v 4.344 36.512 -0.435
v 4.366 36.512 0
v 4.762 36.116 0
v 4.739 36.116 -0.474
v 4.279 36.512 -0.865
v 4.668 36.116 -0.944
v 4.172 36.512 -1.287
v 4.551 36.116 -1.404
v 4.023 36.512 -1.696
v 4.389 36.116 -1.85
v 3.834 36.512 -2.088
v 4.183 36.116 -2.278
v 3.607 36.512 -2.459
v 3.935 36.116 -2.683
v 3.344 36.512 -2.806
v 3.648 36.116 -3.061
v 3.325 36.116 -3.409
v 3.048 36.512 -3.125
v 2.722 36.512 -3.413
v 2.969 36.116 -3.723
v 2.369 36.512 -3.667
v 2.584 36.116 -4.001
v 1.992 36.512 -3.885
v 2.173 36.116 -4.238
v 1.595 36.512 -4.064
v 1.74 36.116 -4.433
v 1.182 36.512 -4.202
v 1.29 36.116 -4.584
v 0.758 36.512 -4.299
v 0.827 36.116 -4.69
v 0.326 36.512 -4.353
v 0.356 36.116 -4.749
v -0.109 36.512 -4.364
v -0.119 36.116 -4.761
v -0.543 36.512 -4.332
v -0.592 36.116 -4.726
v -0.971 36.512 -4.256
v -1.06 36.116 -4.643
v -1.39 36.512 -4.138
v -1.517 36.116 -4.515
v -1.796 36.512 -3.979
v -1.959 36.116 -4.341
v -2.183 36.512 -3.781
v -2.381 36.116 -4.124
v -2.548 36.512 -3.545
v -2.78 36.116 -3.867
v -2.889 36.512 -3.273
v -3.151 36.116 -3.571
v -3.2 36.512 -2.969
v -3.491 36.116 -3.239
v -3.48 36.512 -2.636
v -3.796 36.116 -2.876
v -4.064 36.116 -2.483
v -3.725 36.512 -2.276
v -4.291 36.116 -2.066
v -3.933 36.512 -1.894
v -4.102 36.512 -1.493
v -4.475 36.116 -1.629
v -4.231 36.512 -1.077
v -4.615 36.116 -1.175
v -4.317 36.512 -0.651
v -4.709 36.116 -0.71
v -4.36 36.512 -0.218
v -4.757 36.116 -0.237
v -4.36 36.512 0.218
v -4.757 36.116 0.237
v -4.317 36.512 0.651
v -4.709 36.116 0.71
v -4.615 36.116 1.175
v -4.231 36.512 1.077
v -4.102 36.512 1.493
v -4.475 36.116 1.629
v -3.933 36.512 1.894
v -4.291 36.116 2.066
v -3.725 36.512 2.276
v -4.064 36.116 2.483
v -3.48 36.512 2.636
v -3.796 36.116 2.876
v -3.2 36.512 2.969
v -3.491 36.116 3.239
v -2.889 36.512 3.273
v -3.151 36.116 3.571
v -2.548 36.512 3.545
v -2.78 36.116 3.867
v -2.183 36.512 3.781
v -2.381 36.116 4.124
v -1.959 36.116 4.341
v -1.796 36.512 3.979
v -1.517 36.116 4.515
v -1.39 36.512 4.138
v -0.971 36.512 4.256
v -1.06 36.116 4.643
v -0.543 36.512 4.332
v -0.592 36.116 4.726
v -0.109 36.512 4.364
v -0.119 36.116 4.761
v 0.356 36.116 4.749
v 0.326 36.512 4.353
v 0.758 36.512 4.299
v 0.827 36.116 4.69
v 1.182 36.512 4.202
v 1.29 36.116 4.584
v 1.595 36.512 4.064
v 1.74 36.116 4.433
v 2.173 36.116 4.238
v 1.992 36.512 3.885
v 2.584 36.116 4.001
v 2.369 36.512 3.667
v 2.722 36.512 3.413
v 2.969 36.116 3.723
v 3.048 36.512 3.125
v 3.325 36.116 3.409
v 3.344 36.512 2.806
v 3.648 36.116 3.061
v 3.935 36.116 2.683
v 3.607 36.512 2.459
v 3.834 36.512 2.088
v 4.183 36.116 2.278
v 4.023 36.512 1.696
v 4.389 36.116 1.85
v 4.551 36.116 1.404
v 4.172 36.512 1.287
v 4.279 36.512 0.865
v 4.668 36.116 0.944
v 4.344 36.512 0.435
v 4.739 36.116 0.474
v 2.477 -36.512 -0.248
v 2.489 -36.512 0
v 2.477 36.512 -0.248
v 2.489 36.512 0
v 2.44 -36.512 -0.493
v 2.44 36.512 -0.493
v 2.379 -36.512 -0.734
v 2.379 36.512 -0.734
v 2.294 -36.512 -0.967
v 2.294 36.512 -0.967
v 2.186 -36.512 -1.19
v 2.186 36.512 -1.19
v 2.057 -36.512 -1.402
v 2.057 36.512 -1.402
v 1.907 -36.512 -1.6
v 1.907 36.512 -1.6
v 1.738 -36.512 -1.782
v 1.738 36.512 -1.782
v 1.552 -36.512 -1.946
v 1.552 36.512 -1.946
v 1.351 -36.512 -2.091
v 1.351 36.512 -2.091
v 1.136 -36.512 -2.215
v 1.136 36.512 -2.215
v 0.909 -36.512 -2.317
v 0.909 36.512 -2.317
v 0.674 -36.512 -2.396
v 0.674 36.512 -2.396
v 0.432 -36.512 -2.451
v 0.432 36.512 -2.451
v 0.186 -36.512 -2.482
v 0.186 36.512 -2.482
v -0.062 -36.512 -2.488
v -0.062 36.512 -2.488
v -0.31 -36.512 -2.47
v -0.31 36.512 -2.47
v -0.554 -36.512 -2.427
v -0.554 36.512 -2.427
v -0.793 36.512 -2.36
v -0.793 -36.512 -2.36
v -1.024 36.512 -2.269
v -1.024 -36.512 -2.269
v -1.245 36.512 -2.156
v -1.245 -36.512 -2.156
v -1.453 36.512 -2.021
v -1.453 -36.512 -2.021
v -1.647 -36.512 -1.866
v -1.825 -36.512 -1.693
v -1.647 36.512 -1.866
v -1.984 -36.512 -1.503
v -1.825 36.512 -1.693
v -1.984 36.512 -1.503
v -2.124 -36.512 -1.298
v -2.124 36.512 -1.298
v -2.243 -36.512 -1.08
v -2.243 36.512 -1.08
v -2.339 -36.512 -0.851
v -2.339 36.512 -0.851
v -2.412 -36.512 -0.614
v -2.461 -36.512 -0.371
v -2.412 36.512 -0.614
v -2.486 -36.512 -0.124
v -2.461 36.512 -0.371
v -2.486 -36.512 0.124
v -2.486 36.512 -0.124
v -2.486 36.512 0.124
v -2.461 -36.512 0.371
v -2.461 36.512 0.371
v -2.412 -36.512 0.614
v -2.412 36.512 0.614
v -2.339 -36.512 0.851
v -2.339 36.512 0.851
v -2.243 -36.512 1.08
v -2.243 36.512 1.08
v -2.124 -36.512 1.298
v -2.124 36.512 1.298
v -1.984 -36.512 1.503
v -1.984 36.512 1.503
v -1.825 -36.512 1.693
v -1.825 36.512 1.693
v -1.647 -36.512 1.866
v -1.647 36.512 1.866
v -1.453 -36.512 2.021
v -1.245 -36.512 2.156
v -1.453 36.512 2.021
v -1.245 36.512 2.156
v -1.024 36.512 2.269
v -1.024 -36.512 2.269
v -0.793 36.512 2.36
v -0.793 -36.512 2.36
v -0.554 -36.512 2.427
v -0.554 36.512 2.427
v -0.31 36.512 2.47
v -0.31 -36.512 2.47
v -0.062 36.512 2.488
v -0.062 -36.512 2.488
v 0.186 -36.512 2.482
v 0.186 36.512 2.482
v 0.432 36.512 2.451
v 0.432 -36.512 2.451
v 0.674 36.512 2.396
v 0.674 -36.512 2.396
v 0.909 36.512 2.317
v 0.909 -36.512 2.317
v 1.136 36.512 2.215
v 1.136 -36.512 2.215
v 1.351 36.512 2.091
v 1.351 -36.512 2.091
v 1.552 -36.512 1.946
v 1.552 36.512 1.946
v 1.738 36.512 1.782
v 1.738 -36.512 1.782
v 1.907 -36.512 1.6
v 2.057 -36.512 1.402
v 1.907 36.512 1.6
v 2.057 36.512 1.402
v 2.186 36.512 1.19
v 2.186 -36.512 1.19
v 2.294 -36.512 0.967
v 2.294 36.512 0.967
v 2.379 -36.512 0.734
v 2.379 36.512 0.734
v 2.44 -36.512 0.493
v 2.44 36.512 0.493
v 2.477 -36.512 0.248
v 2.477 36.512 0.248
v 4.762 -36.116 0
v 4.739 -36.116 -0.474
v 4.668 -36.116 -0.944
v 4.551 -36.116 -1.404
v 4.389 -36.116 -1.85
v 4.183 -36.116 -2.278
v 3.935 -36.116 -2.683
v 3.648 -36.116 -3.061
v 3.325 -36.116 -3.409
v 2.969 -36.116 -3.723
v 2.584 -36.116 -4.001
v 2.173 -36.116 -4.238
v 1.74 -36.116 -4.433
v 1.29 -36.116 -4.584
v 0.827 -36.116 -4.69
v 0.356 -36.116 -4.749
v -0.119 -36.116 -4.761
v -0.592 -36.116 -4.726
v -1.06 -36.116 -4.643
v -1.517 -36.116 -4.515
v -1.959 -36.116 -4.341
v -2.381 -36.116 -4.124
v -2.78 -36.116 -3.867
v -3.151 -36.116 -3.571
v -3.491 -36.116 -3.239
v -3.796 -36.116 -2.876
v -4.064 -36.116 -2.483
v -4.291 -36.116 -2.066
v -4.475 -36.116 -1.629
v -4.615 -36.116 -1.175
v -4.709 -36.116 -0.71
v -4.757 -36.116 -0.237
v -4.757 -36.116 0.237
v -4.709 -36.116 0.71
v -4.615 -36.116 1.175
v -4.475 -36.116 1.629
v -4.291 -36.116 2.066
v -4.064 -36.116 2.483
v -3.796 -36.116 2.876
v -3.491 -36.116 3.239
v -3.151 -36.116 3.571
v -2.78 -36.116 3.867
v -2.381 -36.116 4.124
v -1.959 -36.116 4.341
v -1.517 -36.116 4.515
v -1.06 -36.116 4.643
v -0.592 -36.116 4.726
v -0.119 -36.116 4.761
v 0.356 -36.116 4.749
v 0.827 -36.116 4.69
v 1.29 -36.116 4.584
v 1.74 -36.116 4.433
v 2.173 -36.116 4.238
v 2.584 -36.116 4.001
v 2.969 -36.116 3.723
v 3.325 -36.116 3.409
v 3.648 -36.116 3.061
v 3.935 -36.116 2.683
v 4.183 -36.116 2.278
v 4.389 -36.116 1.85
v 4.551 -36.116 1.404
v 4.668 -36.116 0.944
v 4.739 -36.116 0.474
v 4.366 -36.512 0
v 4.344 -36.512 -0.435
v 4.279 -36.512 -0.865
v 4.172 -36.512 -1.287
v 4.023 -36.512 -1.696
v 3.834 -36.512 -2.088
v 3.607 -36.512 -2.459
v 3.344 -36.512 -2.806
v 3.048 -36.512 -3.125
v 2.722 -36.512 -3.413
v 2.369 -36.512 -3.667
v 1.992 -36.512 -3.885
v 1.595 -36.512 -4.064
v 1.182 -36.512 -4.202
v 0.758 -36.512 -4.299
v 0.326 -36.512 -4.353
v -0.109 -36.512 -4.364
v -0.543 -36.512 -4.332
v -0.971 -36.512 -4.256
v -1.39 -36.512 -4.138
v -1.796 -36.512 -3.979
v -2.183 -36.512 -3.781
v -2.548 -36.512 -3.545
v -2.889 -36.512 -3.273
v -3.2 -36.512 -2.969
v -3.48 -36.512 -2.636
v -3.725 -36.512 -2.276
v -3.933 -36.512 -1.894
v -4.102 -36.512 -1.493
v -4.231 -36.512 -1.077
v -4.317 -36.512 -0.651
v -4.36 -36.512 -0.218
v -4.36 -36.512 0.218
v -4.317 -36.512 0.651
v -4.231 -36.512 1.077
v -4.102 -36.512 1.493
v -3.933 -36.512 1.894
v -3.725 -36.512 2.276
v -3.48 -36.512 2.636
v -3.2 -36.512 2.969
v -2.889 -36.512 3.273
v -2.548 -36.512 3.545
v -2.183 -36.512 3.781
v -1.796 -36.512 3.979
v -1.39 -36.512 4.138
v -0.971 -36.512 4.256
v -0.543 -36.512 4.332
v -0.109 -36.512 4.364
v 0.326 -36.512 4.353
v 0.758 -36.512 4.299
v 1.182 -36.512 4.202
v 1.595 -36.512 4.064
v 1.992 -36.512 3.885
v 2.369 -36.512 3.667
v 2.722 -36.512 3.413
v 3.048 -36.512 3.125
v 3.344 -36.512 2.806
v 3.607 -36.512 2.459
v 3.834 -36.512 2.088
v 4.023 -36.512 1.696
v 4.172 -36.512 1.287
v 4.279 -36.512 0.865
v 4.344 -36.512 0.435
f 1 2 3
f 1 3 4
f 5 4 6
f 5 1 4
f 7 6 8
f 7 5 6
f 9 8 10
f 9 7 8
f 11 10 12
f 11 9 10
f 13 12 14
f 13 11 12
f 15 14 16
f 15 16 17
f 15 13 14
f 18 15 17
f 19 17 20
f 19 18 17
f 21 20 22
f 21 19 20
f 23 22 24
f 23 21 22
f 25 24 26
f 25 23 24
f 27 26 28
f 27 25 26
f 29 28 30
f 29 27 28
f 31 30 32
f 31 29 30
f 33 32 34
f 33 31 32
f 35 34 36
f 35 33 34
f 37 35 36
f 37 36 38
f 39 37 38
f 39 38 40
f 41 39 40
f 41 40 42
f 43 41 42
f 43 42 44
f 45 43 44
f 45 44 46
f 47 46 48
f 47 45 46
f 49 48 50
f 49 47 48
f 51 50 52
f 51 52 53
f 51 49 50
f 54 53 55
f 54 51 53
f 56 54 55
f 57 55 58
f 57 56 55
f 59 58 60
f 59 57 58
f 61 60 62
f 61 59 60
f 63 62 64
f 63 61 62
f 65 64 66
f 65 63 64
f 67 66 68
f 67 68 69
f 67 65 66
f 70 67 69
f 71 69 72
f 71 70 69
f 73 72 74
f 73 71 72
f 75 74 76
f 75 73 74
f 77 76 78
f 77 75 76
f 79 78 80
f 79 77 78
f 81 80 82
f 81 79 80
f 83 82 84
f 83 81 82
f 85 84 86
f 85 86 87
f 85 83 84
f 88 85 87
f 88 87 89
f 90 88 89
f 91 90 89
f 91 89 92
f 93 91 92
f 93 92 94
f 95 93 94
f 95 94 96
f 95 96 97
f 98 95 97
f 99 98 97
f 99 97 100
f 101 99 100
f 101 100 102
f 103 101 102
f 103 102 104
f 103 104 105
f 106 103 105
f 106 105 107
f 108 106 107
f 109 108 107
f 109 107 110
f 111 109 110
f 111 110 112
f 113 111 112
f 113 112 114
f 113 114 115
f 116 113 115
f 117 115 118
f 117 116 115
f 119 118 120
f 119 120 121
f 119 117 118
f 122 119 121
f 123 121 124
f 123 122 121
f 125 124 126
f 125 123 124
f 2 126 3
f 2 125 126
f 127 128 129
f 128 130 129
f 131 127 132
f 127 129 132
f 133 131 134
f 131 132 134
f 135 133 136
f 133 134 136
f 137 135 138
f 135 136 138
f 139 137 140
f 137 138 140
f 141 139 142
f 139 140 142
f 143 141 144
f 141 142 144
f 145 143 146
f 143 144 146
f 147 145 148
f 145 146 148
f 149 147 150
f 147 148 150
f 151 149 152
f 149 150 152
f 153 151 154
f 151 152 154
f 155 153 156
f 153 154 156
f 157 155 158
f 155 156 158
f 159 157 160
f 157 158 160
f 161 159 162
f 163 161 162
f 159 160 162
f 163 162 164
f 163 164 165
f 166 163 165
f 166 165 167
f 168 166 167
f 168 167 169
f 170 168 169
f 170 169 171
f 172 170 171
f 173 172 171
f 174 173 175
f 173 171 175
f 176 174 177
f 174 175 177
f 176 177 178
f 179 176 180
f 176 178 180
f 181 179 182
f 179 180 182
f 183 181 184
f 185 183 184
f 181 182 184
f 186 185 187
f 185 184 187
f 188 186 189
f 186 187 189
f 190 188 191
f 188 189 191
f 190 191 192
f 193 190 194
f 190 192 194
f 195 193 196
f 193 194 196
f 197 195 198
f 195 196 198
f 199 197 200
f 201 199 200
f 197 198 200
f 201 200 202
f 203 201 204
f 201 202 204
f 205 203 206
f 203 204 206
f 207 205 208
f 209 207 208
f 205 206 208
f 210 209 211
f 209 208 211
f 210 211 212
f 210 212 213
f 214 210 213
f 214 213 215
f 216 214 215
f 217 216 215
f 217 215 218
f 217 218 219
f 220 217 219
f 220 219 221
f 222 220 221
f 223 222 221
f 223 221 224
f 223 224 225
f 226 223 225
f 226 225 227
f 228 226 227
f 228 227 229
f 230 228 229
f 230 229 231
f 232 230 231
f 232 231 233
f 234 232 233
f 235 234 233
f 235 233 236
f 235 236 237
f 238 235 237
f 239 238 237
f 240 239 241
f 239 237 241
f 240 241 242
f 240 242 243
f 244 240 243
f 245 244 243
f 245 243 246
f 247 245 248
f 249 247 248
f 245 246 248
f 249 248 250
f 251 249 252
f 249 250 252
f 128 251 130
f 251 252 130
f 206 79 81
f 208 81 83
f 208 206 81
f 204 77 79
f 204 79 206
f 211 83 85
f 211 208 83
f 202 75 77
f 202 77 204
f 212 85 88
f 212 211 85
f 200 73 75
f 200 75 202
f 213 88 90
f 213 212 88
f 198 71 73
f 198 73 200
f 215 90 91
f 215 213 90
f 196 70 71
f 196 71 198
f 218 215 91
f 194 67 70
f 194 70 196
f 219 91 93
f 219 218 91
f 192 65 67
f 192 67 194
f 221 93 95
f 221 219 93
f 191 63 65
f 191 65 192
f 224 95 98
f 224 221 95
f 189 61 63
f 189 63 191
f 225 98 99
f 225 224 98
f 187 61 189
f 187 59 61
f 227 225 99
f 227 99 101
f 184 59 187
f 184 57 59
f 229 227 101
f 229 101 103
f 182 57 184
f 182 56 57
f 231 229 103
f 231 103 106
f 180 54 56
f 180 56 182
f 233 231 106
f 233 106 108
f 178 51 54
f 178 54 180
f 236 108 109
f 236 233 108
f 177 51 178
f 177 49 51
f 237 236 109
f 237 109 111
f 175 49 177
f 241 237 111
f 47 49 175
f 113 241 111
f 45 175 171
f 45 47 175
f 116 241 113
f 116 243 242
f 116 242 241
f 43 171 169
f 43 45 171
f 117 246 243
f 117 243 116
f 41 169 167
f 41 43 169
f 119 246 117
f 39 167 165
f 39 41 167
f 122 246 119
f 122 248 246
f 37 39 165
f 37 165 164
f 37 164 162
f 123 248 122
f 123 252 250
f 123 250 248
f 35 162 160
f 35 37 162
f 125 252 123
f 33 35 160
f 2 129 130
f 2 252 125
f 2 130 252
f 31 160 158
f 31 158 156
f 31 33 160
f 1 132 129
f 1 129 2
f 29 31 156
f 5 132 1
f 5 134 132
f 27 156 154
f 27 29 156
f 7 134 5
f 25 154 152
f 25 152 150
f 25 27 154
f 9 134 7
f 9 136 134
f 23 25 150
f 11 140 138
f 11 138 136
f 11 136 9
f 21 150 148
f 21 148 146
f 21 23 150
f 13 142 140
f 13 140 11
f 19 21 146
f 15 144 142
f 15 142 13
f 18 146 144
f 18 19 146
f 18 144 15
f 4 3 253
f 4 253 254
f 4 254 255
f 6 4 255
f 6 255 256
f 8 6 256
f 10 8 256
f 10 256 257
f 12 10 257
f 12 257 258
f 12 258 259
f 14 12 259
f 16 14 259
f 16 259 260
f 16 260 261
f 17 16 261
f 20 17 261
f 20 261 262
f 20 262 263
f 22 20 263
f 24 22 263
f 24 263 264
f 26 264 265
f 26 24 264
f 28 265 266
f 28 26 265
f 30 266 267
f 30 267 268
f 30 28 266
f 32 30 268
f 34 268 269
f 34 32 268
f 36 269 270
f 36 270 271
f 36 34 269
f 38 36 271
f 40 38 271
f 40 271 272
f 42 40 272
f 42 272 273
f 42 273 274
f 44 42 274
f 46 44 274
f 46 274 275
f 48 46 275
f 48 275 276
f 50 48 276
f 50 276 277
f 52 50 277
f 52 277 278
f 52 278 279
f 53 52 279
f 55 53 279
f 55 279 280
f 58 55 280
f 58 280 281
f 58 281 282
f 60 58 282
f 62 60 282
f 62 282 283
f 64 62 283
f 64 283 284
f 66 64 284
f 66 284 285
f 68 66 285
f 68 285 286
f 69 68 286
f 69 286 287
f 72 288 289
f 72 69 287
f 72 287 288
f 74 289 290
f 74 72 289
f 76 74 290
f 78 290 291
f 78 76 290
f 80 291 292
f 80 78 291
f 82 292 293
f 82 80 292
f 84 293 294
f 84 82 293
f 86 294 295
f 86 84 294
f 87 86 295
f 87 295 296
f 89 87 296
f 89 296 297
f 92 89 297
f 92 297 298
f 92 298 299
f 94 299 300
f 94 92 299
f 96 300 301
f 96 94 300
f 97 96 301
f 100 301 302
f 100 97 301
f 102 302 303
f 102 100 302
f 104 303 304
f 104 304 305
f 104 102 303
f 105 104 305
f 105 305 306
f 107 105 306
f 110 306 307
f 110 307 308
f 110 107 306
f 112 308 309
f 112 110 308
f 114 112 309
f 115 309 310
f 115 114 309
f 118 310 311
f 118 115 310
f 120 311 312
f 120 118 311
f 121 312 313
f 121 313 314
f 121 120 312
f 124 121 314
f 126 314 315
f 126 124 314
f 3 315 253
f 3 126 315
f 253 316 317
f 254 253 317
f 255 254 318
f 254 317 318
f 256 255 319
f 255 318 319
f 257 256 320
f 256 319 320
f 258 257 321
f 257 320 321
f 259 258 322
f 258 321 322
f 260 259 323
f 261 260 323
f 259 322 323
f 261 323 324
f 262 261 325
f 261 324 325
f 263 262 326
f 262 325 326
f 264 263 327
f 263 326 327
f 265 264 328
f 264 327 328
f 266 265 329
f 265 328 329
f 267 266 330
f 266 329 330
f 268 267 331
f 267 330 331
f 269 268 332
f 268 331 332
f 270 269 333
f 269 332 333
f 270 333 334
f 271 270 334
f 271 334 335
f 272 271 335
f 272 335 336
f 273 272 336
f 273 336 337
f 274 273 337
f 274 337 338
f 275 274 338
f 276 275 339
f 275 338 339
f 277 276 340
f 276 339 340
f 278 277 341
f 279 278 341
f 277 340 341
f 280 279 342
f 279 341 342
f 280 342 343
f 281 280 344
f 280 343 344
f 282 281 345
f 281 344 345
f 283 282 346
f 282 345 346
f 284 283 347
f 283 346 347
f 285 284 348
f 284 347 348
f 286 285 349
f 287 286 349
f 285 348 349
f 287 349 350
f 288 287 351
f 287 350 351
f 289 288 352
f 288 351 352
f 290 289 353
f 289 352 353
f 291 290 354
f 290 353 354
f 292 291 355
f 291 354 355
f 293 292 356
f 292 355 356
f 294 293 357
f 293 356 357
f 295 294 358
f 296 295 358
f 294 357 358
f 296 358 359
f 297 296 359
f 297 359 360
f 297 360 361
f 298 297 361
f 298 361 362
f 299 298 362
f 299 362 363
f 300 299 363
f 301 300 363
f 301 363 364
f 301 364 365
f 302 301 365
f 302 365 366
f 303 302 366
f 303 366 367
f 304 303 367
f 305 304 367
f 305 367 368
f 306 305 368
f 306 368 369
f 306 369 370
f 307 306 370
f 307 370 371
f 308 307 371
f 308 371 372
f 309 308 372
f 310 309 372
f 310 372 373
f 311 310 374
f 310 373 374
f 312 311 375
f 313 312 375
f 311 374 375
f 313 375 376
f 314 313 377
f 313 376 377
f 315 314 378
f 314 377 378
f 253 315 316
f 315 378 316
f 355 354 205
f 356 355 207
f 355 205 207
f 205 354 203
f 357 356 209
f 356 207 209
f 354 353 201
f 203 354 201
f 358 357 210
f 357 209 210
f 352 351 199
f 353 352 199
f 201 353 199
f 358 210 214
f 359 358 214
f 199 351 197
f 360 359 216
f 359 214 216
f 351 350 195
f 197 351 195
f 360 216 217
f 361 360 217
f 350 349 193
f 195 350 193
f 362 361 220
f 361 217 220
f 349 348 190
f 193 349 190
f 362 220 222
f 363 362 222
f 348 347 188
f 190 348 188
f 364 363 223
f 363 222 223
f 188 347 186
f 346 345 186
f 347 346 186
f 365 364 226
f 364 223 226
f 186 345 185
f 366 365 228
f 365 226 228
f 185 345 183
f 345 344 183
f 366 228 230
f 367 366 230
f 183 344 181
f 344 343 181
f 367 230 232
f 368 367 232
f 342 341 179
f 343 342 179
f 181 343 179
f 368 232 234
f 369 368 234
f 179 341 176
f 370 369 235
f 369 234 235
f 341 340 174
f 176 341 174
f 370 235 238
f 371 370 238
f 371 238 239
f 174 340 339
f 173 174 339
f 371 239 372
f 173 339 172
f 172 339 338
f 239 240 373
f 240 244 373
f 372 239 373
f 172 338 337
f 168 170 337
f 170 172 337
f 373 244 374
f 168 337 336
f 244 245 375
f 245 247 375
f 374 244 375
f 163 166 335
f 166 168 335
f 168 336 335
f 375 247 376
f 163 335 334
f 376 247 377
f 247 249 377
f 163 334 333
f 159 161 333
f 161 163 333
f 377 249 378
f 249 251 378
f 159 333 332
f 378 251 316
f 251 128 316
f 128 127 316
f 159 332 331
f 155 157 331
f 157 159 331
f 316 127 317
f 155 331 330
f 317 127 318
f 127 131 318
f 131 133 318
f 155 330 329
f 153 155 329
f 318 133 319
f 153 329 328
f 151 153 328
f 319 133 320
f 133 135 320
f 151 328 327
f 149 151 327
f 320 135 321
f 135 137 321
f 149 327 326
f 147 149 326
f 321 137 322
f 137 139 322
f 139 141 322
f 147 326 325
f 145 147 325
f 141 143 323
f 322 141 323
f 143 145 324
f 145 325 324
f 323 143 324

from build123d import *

# Parameters (mm, degrees)
CROQUIS2_R                = 4.7625
SALIENTE_EXTRUIR1_DEPTH   = 36.5125
CHAFL_N1_SIZE             = 0.396875
CLEARANCE_HOLE_DEPTH      = 38.128499414
CLEARANCE_HOLE_DEPTH_BACK = 38.128499414
CROQUIS4_R                = 2.4892


with BuildPart() as part:
    # Croquis2 → Saliente-Extruir1 (new, symmetric)
    with BuildSketch(Plane(origin=(0, 0, 0), x_dir=(1, 0, 0), z_dir=(0, 1, 0))):
        Circle(CROQUIS2_R)
    extrude(amount=SALIENTE_EXTRUIR1_DEPTH, both=True)

    # Chaflán1
    chafl_n1_edges = [part.edges().sort_by_distance(p)[0] for p in [
        (-4.7625, -36.5125, 0),
        (-4.7625, 36.5125, 0),
    ]]
    chamfer(chafl_n1_edges, length=CHAFL_N1_SIZE)

    # Croquis4 → Clearance Hole (cut, two sides: drawn at the far end of the back side and taken through both)
    with BuildSketch(Plane(origin=(0, 0, 0), x_dir=(1, 0, 0), z_dir=(0, 1, 0)).offset(-CLEARANCE_HOLE_DEPTH_BACK)):
        Circle(CROQUIS4_R)
    extrude(amount=CLEARANCE_HOLE_DEPTH + CLEARANCE_HOLE_DEPTH_BACK, mode=Mode.SUBTRACT)


solid = part.part
